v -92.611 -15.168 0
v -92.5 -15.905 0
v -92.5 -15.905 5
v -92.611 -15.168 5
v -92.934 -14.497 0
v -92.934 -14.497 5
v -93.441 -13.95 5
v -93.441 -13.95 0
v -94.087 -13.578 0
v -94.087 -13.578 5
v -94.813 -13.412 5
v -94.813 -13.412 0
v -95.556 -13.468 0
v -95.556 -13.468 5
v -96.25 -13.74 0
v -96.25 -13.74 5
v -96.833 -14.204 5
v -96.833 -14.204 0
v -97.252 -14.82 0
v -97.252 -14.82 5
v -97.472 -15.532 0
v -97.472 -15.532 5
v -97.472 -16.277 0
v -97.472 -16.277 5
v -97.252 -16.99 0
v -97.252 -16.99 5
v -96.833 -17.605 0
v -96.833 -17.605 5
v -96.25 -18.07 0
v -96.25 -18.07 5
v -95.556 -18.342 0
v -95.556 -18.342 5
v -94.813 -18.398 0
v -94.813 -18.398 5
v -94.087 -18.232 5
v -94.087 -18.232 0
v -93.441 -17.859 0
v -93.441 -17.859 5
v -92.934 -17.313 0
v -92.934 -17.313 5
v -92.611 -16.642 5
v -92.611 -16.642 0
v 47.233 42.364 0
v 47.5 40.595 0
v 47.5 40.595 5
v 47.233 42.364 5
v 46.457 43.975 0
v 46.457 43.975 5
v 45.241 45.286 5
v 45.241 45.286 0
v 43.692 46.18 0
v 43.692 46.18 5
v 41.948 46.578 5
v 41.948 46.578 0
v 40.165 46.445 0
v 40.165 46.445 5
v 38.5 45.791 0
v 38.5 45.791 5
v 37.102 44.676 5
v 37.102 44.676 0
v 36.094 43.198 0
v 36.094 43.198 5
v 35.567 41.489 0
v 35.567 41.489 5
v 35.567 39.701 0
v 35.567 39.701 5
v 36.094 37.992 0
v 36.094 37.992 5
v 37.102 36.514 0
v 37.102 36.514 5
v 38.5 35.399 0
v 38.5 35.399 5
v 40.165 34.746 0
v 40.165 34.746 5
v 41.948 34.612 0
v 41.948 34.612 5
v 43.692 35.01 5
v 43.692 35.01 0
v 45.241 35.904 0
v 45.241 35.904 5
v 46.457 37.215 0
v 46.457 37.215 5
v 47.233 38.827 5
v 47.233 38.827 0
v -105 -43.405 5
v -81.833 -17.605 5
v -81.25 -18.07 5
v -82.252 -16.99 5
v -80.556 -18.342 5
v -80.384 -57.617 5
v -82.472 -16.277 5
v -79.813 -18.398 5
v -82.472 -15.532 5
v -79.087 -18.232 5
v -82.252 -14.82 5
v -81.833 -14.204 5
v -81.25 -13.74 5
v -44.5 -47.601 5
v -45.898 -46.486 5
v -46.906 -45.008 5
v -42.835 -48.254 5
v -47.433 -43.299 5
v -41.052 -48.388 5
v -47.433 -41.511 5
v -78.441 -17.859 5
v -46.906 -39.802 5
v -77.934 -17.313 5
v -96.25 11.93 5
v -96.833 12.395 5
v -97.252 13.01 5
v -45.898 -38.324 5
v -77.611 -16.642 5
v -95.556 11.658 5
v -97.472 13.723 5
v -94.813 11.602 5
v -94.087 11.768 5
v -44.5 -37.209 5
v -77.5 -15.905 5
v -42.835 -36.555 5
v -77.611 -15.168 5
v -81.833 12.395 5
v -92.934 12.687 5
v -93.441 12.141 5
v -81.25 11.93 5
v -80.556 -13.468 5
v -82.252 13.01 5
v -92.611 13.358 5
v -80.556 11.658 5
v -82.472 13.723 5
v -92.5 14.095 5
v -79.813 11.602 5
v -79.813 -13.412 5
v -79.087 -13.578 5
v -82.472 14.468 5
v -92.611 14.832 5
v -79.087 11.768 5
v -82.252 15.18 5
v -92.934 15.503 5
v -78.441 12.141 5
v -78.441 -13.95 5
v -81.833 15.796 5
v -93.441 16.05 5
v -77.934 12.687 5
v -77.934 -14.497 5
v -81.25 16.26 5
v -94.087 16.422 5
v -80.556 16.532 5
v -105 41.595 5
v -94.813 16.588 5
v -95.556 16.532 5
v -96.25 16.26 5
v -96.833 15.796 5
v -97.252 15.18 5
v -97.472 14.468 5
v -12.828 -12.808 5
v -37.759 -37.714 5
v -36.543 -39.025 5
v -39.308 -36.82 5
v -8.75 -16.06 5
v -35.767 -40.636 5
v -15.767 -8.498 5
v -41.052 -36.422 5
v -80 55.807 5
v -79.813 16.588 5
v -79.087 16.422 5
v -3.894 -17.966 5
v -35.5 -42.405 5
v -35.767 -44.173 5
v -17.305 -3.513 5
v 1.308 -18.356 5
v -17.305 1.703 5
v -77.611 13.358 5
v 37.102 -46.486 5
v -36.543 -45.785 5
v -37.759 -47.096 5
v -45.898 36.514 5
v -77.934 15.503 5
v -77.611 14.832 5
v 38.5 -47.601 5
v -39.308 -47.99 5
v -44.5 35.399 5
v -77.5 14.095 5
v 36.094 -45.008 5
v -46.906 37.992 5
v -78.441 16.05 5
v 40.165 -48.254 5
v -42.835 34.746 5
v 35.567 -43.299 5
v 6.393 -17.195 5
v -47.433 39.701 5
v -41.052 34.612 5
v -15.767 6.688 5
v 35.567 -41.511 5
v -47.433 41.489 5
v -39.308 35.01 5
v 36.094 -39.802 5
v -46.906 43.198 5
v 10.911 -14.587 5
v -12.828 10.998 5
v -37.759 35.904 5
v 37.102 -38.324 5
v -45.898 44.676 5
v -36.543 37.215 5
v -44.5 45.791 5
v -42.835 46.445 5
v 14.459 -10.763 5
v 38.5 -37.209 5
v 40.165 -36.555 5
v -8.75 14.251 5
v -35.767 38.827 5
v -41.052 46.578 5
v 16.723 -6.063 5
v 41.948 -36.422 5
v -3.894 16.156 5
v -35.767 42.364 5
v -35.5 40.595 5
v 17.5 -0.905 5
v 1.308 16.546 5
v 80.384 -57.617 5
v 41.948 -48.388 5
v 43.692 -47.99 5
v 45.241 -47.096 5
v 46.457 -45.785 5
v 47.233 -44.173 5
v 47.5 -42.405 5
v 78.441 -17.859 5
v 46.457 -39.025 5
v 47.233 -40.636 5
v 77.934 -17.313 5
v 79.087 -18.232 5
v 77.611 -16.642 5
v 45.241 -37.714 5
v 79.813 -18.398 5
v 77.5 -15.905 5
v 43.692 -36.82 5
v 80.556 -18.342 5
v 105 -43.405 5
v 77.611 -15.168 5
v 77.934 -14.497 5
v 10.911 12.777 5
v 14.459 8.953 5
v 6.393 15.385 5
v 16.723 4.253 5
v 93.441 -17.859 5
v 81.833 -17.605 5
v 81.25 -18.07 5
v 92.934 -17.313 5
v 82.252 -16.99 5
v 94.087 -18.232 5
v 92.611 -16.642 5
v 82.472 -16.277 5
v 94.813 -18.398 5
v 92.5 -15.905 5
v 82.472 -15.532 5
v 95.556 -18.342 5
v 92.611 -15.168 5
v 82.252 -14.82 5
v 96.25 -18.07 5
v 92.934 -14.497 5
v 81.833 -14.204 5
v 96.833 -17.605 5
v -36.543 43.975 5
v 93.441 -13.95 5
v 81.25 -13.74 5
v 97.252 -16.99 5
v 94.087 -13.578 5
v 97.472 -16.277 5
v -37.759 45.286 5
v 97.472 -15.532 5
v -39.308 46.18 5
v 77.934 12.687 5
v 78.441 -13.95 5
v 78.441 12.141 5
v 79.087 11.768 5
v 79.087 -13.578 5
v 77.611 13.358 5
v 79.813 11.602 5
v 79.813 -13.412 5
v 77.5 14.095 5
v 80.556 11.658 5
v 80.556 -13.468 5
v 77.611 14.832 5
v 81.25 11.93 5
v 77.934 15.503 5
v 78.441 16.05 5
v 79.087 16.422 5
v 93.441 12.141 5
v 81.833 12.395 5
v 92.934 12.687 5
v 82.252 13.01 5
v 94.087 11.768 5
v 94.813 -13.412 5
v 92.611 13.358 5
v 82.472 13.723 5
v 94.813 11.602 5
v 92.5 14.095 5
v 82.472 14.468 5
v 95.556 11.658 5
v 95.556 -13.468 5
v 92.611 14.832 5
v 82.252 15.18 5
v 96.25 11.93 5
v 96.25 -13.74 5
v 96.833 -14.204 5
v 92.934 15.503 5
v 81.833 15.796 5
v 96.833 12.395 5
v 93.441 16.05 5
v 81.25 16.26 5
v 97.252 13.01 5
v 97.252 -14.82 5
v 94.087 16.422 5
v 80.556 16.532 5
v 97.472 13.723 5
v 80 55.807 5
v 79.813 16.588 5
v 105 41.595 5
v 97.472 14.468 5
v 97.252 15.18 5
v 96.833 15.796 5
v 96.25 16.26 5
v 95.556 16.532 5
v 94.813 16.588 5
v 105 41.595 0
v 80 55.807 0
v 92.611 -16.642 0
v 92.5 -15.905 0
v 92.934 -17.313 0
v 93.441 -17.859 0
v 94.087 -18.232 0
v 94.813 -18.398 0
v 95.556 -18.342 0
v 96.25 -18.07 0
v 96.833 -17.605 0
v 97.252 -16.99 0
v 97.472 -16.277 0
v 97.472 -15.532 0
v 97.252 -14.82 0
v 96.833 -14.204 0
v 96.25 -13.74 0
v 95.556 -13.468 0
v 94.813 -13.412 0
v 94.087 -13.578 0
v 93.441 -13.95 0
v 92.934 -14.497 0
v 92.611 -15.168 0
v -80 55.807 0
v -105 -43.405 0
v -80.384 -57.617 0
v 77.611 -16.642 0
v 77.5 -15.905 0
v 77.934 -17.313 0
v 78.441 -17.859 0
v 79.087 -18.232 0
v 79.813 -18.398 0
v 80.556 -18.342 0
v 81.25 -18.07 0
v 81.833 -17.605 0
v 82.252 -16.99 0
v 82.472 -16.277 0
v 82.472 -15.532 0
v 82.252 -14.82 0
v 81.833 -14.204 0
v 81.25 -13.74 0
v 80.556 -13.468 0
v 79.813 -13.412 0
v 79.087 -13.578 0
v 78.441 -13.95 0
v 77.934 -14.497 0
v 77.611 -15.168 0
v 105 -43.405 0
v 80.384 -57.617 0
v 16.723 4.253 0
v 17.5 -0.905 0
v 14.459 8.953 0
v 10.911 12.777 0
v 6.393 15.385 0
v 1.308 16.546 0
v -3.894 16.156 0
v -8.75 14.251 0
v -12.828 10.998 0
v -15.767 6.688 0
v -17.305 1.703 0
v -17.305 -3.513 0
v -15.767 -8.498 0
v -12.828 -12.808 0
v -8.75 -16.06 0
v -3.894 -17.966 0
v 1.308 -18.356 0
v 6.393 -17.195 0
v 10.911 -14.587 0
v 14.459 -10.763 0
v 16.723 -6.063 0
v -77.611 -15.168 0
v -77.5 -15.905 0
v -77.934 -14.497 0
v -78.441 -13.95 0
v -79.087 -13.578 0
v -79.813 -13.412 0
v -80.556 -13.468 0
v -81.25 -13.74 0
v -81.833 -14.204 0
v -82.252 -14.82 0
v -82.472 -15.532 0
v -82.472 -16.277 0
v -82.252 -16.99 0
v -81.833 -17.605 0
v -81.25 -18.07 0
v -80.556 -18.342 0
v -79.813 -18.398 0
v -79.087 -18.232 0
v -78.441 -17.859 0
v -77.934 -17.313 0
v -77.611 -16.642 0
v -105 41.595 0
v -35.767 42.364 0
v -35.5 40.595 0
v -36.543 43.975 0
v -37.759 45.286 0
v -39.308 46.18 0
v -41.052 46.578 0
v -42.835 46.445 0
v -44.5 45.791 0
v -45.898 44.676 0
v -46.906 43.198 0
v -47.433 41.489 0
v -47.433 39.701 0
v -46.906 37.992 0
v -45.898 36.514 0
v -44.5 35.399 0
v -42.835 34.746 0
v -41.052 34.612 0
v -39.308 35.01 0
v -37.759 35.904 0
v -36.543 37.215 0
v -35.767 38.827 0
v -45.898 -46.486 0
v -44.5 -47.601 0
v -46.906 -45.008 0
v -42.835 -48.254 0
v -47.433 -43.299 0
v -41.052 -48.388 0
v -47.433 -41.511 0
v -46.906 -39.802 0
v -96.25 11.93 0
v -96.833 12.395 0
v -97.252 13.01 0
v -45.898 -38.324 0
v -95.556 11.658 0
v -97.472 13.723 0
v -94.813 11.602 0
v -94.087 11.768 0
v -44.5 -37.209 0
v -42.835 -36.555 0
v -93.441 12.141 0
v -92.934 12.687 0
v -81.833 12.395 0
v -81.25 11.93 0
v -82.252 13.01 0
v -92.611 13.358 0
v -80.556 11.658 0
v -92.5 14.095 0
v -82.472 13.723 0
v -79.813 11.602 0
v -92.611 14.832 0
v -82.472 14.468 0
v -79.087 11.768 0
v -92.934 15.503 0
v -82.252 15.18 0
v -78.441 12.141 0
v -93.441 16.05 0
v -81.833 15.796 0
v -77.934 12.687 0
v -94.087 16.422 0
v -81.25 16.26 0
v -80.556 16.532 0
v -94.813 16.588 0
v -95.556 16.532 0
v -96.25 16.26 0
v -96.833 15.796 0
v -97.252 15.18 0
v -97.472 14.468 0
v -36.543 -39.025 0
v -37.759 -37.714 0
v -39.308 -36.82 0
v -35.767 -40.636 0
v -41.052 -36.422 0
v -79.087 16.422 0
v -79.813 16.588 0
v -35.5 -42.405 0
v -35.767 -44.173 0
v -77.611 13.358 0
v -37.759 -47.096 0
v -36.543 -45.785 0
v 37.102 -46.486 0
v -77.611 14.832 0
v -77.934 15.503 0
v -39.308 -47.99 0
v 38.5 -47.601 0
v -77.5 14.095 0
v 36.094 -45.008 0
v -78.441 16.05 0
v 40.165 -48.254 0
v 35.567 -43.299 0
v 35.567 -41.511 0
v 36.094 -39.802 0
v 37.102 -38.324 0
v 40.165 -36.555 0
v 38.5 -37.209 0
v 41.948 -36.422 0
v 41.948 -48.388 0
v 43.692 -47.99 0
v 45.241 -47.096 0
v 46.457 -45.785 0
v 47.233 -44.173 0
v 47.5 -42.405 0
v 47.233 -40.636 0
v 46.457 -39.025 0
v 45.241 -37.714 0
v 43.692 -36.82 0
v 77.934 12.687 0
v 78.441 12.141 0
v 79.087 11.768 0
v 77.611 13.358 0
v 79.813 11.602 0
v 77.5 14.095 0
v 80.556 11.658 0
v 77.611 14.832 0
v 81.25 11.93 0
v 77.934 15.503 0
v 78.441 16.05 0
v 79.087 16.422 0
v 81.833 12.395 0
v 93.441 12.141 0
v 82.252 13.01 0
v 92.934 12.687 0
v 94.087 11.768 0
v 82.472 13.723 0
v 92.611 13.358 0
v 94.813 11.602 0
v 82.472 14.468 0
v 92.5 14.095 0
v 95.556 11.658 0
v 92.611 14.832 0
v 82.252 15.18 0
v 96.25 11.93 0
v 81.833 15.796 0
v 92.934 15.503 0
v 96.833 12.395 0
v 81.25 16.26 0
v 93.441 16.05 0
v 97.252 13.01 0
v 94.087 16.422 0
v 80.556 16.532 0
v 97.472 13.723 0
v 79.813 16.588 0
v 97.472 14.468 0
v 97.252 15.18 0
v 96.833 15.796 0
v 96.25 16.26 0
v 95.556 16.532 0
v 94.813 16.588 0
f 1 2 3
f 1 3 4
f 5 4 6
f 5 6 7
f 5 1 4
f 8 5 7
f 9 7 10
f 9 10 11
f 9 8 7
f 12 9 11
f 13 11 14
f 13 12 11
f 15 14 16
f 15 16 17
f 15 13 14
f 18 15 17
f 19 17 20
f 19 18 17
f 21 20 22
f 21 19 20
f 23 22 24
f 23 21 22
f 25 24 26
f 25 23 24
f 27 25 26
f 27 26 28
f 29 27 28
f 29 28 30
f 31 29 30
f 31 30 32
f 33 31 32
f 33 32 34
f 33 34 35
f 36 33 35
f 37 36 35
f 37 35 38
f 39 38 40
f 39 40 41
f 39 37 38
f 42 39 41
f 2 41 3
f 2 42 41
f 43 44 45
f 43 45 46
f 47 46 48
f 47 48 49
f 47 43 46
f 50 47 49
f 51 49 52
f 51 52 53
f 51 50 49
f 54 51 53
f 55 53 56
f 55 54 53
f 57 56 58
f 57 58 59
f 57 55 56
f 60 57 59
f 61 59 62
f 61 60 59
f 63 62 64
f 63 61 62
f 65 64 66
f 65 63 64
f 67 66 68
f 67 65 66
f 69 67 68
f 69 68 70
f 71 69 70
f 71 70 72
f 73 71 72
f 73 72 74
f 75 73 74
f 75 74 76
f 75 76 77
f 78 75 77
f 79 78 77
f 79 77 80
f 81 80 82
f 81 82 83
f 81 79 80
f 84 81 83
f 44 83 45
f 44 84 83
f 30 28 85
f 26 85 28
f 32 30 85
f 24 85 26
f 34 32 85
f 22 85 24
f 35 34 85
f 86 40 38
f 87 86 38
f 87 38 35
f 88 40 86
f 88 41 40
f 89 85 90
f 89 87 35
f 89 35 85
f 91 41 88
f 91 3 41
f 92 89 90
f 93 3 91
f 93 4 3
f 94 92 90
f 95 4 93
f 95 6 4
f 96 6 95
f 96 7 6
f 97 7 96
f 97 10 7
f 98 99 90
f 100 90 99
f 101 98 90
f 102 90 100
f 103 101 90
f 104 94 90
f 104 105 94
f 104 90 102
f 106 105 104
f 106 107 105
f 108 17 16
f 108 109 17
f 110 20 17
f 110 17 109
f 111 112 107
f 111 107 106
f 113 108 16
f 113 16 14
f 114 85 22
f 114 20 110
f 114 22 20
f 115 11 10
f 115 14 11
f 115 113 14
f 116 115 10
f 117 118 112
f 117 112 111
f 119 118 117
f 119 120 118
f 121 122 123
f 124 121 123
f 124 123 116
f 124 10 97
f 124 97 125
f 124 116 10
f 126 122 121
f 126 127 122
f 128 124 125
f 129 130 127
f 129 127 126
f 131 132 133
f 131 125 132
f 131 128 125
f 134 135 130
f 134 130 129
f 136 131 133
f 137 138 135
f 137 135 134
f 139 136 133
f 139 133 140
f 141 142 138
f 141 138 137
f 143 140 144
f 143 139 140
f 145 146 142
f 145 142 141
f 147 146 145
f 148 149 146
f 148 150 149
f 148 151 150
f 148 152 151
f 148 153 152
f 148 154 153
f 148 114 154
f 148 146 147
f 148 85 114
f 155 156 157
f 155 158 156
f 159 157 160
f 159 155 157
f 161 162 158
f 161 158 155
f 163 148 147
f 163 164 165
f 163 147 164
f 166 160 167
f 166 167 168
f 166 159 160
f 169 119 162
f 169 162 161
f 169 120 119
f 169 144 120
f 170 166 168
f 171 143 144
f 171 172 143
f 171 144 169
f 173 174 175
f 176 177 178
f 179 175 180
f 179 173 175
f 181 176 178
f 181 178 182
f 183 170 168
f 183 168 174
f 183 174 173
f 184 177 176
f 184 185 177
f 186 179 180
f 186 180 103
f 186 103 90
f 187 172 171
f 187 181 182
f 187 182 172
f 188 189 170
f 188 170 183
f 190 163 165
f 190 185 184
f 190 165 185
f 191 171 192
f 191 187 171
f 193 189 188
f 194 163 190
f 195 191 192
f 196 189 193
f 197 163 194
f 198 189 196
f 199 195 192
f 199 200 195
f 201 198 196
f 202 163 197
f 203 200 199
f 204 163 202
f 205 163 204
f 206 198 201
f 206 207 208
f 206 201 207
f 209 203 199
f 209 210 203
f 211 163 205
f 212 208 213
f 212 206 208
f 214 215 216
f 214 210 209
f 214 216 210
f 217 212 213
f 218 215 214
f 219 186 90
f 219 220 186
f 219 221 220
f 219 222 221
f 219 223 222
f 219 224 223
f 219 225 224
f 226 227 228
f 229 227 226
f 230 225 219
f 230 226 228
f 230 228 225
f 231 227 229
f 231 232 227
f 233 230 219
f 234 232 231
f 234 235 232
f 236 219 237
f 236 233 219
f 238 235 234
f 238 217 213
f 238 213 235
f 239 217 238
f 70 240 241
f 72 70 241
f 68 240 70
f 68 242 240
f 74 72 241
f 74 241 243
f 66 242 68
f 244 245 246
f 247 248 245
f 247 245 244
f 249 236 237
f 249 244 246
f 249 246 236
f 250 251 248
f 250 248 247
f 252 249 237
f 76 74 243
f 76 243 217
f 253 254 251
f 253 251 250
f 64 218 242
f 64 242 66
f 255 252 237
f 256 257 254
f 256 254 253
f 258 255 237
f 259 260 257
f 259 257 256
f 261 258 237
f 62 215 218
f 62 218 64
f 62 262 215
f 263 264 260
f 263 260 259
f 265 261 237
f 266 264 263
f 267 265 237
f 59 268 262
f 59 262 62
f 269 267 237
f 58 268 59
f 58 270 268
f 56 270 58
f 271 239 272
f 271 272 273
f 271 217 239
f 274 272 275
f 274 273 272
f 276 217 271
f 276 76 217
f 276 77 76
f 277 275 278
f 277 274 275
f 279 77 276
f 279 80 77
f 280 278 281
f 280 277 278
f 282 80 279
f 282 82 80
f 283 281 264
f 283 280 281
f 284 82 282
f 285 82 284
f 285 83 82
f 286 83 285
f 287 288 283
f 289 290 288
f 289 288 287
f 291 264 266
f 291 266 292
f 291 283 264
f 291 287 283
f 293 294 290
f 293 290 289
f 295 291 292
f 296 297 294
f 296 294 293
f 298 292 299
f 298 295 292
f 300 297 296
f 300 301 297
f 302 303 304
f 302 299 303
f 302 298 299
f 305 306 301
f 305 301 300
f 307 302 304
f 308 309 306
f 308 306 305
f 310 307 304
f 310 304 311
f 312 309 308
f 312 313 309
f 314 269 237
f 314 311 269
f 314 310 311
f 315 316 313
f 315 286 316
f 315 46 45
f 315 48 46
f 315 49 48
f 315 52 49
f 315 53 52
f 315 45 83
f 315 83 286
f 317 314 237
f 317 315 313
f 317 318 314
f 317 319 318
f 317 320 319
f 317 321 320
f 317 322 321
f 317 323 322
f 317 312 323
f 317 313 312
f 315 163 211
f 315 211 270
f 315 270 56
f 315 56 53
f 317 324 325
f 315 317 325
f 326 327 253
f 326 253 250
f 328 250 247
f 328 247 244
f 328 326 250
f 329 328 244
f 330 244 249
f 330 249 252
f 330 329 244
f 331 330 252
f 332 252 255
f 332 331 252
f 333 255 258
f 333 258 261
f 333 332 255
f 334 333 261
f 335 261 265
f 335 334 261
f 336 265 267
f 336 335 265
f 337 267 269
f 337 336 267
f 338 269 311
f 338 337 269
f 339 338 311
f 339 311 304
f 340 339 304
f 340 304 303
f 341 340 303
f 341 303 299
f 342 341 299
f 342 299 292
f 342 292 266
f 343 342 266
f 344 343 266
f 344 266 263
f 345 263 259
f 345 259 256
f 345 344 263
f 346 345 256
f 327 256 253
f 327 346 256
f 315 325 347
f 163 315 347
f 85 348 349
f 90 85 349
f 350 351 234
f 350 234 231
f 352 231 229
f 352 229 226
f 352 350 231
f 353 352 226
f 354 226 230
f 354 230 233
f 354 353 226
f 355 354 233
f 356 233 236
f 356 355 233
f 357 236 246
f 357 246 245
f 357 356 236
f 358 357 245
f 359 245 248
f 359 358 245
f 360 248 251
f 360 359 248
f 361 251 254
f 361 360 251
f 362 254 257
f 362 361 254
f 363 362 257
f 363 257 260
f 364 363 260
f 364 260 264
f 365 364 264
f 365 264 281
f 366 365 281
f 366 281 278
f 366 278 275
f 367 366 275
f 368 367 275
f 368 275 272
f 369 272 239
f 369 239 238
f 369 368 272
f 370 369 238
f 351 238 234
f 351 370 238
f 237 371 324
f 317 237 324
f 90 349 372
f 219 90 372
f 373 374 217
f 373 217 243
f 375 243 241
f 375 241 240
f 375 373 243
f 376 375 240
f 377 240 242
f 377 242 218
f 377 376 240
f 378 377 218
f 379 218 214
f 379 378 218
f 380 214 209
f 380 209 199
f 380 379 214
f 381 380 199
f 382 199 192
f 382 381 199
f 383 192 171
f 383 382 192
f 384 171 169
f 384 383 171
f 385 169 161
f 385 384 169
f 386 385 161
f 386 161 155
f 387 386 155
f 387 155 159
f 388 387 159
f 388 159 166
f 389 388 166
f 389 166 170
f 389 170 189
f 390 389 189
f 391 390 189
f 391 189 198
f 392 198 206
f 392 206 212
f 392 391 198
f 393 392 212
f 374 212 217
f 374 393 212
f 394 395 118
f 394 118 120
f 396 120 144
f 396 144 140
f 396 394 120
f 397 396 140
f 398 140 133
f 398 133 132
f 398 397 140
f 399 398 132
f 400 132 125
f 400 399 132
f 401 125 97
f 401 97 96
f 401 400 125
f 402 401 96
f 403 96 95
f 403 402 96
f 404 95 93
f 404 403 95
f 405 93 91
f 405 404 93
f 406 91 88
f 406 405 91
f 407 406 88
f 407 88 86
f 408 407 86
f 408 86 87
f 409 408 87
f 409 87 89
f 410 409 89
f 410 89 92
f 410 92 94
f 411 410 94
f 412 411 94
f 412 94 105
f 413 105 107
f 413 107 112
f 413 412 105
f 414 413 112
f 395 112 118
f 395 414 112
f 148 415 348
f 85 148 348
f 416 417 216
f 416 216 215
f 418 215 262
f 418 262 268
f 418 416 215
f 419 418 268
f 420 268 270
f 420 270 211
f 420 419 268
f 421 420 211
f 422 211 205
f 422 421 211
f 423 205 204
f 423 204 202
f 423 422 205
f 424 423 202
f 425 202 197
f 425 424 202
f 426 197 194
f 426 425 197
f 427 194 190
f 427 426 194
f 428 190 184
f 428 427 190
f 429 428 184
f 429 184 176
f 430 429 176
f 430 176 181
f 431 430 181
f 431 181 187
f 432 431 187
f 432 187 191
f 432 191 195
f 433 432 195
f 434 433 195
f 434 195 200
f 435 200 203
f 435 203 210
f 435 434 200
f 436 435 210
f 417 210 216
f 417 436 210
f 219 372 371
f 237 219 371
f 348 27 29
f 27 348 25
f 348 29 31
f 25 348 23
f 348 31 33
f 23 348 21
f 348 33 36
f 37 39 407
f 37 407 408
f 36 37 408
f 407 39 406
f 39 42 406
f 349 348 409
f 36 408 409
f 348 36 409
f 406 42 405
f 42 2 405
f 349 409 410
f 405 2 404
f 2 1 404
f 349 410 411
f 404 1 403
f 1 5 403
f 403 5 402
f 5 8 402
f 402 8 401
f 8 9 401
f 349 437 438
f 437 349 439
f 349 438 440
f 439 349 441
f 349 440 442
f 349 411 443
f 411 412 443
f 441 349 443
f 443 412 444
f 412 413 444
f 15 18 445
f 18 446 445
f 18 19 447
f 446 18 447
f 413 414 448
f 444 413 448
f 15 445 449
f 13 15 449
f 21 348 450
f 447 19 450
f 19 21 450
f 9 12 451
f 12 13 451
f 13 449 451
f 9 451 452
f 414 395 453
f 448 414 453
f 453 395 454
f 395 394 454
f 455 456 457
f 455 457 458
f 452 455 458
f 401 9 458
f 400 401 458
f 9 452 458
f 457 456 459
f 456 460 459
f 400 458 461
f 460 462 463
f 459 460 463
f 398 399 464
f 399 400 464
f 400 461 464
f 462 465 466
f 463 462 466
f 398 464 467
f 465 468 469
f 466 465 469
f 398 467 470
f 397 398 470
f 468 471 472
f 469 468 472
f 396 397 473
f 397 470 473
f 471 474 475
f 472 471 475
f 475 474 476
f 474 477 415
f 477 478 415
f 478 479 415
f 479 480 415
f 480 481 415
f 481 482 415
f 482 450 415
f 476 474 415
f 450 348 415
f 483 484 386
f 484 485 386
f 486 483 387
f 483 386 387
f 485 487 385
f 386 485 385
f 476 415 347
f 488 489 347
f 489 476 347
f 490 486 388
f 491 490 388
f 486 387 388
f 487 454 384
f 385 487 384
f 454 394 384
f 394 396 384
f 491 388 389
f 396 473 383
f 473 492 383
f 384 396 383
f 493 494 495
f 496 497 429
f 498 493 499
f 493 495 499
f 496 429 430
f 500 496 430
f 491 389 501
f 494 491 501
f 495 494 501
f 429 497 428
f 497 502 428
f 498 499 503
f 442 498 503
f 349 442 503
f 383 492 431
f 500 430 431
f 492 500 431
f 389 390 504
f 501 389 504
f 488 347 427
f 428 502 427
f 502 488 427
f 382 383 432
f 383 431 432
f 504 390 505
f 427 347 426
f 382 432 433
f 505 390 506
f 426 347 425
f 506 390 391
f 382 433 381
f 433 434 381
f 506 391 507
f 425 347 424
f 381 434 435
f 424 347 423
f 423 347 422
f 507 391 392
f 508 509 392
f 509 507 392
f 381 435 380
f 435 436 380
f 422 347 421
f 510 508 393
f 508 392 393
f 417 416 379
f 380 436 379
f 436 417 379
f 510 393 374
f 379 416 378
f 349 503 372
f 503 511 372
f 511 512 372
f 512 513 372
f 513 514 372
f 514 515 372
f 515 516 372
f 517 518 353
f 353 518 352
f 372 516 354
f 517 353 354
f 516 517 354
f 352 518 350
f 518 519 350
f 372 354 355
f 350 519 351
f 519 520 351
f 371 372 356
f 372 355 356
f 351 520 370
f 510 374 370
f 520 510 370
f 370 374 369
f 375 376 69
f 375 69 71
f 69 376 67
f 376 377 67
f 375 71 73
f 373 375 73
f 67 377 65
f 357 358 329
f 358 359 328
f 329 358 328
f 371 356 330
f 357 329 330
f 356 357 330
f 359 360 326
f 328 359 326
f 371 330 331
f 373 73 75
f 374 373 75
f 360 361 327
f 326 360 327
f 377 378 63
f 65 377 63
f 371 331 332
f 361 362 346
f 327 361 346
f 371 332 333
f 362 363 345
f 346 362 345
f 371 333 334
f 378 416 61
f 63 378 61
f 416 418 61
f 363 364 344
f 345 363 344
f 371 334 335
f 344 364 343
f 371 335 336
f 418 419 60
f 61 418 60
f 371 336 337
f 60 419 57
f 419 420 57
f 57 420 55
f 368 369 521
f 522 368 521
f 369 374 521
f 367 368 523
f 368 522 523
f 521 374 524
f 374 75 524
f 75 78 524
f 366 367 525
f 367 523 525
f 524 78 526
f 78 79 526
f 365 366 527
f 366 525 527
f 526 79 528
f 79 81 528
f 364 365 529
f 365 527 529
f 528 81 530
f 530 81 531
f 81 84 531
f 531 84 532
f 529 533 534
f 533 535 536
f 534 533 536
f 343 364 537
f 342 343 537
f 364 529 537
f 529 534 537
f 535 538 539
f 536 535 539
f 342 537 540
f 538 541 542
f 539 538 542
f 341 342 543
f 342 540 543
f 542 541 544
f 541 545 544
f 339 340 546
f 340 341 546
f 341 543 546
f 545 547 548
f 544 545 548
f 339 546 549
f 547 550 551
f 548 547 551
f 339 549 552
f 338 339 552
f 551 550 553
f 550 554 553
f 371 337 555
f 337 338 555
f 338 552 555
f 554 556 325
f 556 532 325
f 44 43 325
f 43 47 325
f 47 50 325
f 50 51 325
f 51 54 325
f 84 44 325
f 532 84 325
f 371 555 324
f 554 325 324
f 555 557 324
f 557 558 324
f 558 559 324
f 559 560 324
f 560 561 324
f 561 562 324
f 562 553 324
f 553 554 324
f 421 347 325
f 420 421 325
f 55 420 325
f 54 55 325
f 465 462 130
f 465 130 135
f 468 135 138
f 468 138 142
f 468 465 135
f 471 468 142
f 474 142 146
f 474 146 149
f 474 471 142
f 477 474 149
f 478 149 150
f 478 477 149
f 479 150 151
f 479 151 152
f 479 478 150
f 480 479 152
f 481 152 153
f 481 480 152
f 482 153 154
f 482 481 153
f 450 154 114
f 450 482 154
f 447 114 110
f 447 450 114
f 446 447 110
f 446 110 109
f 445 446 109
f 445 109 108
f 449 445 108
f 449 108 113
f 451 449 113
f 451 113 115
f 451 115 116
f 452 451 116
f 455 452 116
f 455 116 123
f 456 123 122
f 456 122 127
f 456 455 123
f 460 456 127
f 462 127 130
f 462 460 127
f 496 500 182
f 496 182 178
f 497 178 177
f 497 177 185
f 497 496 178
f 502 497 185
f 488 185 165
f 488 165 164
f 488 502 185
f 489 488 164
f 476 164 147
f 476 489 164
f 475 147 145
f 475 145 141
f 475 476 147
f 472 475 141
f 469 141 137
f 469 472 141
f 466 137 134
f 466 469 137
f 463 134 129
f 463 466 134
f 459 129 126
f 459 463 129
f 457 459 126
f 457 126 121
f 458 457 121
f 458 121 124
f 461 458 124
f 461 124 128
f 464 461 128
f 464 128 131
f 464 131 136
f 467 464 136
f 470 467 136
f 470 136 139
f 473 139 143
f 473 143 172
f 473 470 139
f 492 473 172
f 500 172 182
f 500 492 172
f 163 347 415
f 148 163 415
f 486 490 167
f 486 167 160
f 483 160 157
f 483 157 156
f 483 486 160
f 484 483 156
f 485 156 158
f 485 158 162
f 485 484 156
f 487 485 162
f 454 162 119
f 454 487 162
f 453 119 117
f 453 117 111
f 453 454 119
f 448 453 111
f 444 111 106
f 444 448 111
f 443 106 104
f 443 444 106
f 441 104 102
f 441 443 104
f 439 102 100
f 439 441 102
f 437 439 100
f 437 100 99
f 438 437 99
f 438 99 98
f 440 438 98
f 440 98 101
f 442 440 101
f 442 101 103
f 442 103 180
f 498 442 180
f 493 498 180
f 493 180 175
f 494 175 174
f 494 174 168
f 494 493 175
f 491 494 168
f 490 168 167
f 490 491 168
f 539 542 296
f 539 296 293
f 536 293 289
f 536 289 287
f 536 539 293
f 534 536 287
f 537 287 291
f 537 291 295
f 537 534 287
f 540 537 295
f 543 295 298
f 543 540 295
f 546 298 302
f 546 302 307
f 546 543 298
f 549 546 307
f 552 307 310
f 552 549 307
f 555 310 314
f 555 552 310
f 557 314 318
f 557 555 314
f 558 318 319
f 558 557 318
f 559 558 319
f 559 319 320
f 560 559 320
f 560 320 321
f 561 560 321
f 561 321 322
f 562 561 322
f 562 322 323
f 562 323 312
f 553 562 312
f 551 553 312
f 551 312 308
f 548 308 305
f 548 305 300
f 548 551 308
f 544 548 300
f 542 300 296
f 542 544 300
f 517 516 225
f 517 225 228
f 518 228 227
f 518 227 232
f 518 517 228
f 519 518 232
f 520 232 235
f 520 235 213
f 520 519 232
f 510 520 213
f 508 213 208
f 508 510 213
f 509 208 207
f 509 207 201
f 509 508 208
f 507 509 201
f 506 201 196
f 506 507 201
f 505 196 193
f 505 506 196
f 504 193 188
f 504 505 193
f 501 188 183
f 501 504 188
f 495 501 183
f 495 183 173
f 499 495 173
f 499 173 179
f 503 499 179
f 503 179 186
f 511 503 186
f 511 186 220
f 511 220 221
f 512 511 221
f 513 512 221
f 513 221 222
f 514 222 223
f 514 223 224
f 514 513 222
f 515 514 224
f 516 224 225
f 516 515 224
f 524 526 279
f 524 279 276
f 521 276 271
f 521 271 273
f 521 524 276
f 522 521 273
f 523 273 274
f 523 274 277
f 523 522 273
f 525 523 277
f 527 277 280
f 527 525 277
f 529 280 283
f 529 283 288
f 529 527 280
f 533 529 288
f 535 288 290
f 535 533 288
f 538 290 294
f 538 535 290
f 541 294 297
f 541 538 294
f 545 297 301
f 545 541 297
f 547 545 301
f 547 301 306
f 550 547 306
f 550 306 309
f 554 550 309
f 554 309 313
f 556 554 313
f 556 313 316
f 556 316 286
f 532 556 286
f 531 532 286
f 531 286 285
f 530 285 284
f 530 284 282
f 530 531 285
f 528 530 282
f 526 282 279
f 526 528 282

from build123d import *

# Parameters (mm, degrees)
SKETCH1_R           = 17.5
SKETCH1_R_2         = 2.5
SKETCH1_R_3         = 6
BOSS_EXTRUDE1_DEPTH = 5


with BuildPart() as part:
    # Sketch1 → Boss-Extrude1 (new body)
    with BuildSketch(Plane.XY):
        Polygon((80, 55.80696734), (-80, 55.80696734), (-105, 41.595146974), (-105, -43.404853026), (-80.384405058, -57.616673392), (80.384405058, -57.616673392), (105, -43.404853026), (105, 41.595146974), align=None)
        with Locations((0, -0.904853026)):
            Circle(SKETCH1_R, mode=Mode.SUBTRACT)
        with Locations((-95, 14.095146974)):
            Circle(SKETCH1_R_2, mode=Mode.SUBTRACT)
        with Locations((-80, 14.095146974)):
            Circle(SKETCH1_R_2, mode=Mode.SUBTRACT)
        with Locations((-95, -15.904853026)):
            Circle(SKETCH1_R_2, mode=Mode.SUBTRACT)
        with Locations((-80, -15.904853026)):
            Circle(SKETCH1_R_2, mode=Mode.SUBTRACT)
        with Locations(Location((80, -15.904853026, 0), (0, 0, 180))):
            Circle(SKETCH1_R_2, mode=Mode.SUBTRACT)
        with Locations(Location((95, -15.904853026, 0), (0, 0, 180))):
            Circle(SKETCH1_R_2, mode=Mode.SUBTRACT)
        with Locations(Location((95, 14.095146974, 0), (0, 0, 180))):
            Circle(SKETCH1_R_2, mode=Mode.SUBTRACT)
        with Locations(Location((80, 14.095146974, 0), (0, 0, 180))):
            Circle(SKETCH1_R_2, mode=Mode.SUBTRACT)
        with Locations((-41.5, 40.595146974)):
            Circle(SKETCH1_R_3, mode=Mode.SUBTRACT)
        with Locations((41.5, 40.595146974)):
            Circle(SKETCH1_R_3, mode=Mode.SUBTRACT)
        with Locations((41.5, -42.404853026)):
            Circle(SKETCH1_R_3, mode=Mode.SUBTRACT)
        with Locations((-41.5, -42.404853026)):
            Circle(SKETCH1_R_3, mode=Mode.SUBTRACT)
    extrude(amount=BOSS_EXTRUDE1_DEPTH)


solid = part.part
